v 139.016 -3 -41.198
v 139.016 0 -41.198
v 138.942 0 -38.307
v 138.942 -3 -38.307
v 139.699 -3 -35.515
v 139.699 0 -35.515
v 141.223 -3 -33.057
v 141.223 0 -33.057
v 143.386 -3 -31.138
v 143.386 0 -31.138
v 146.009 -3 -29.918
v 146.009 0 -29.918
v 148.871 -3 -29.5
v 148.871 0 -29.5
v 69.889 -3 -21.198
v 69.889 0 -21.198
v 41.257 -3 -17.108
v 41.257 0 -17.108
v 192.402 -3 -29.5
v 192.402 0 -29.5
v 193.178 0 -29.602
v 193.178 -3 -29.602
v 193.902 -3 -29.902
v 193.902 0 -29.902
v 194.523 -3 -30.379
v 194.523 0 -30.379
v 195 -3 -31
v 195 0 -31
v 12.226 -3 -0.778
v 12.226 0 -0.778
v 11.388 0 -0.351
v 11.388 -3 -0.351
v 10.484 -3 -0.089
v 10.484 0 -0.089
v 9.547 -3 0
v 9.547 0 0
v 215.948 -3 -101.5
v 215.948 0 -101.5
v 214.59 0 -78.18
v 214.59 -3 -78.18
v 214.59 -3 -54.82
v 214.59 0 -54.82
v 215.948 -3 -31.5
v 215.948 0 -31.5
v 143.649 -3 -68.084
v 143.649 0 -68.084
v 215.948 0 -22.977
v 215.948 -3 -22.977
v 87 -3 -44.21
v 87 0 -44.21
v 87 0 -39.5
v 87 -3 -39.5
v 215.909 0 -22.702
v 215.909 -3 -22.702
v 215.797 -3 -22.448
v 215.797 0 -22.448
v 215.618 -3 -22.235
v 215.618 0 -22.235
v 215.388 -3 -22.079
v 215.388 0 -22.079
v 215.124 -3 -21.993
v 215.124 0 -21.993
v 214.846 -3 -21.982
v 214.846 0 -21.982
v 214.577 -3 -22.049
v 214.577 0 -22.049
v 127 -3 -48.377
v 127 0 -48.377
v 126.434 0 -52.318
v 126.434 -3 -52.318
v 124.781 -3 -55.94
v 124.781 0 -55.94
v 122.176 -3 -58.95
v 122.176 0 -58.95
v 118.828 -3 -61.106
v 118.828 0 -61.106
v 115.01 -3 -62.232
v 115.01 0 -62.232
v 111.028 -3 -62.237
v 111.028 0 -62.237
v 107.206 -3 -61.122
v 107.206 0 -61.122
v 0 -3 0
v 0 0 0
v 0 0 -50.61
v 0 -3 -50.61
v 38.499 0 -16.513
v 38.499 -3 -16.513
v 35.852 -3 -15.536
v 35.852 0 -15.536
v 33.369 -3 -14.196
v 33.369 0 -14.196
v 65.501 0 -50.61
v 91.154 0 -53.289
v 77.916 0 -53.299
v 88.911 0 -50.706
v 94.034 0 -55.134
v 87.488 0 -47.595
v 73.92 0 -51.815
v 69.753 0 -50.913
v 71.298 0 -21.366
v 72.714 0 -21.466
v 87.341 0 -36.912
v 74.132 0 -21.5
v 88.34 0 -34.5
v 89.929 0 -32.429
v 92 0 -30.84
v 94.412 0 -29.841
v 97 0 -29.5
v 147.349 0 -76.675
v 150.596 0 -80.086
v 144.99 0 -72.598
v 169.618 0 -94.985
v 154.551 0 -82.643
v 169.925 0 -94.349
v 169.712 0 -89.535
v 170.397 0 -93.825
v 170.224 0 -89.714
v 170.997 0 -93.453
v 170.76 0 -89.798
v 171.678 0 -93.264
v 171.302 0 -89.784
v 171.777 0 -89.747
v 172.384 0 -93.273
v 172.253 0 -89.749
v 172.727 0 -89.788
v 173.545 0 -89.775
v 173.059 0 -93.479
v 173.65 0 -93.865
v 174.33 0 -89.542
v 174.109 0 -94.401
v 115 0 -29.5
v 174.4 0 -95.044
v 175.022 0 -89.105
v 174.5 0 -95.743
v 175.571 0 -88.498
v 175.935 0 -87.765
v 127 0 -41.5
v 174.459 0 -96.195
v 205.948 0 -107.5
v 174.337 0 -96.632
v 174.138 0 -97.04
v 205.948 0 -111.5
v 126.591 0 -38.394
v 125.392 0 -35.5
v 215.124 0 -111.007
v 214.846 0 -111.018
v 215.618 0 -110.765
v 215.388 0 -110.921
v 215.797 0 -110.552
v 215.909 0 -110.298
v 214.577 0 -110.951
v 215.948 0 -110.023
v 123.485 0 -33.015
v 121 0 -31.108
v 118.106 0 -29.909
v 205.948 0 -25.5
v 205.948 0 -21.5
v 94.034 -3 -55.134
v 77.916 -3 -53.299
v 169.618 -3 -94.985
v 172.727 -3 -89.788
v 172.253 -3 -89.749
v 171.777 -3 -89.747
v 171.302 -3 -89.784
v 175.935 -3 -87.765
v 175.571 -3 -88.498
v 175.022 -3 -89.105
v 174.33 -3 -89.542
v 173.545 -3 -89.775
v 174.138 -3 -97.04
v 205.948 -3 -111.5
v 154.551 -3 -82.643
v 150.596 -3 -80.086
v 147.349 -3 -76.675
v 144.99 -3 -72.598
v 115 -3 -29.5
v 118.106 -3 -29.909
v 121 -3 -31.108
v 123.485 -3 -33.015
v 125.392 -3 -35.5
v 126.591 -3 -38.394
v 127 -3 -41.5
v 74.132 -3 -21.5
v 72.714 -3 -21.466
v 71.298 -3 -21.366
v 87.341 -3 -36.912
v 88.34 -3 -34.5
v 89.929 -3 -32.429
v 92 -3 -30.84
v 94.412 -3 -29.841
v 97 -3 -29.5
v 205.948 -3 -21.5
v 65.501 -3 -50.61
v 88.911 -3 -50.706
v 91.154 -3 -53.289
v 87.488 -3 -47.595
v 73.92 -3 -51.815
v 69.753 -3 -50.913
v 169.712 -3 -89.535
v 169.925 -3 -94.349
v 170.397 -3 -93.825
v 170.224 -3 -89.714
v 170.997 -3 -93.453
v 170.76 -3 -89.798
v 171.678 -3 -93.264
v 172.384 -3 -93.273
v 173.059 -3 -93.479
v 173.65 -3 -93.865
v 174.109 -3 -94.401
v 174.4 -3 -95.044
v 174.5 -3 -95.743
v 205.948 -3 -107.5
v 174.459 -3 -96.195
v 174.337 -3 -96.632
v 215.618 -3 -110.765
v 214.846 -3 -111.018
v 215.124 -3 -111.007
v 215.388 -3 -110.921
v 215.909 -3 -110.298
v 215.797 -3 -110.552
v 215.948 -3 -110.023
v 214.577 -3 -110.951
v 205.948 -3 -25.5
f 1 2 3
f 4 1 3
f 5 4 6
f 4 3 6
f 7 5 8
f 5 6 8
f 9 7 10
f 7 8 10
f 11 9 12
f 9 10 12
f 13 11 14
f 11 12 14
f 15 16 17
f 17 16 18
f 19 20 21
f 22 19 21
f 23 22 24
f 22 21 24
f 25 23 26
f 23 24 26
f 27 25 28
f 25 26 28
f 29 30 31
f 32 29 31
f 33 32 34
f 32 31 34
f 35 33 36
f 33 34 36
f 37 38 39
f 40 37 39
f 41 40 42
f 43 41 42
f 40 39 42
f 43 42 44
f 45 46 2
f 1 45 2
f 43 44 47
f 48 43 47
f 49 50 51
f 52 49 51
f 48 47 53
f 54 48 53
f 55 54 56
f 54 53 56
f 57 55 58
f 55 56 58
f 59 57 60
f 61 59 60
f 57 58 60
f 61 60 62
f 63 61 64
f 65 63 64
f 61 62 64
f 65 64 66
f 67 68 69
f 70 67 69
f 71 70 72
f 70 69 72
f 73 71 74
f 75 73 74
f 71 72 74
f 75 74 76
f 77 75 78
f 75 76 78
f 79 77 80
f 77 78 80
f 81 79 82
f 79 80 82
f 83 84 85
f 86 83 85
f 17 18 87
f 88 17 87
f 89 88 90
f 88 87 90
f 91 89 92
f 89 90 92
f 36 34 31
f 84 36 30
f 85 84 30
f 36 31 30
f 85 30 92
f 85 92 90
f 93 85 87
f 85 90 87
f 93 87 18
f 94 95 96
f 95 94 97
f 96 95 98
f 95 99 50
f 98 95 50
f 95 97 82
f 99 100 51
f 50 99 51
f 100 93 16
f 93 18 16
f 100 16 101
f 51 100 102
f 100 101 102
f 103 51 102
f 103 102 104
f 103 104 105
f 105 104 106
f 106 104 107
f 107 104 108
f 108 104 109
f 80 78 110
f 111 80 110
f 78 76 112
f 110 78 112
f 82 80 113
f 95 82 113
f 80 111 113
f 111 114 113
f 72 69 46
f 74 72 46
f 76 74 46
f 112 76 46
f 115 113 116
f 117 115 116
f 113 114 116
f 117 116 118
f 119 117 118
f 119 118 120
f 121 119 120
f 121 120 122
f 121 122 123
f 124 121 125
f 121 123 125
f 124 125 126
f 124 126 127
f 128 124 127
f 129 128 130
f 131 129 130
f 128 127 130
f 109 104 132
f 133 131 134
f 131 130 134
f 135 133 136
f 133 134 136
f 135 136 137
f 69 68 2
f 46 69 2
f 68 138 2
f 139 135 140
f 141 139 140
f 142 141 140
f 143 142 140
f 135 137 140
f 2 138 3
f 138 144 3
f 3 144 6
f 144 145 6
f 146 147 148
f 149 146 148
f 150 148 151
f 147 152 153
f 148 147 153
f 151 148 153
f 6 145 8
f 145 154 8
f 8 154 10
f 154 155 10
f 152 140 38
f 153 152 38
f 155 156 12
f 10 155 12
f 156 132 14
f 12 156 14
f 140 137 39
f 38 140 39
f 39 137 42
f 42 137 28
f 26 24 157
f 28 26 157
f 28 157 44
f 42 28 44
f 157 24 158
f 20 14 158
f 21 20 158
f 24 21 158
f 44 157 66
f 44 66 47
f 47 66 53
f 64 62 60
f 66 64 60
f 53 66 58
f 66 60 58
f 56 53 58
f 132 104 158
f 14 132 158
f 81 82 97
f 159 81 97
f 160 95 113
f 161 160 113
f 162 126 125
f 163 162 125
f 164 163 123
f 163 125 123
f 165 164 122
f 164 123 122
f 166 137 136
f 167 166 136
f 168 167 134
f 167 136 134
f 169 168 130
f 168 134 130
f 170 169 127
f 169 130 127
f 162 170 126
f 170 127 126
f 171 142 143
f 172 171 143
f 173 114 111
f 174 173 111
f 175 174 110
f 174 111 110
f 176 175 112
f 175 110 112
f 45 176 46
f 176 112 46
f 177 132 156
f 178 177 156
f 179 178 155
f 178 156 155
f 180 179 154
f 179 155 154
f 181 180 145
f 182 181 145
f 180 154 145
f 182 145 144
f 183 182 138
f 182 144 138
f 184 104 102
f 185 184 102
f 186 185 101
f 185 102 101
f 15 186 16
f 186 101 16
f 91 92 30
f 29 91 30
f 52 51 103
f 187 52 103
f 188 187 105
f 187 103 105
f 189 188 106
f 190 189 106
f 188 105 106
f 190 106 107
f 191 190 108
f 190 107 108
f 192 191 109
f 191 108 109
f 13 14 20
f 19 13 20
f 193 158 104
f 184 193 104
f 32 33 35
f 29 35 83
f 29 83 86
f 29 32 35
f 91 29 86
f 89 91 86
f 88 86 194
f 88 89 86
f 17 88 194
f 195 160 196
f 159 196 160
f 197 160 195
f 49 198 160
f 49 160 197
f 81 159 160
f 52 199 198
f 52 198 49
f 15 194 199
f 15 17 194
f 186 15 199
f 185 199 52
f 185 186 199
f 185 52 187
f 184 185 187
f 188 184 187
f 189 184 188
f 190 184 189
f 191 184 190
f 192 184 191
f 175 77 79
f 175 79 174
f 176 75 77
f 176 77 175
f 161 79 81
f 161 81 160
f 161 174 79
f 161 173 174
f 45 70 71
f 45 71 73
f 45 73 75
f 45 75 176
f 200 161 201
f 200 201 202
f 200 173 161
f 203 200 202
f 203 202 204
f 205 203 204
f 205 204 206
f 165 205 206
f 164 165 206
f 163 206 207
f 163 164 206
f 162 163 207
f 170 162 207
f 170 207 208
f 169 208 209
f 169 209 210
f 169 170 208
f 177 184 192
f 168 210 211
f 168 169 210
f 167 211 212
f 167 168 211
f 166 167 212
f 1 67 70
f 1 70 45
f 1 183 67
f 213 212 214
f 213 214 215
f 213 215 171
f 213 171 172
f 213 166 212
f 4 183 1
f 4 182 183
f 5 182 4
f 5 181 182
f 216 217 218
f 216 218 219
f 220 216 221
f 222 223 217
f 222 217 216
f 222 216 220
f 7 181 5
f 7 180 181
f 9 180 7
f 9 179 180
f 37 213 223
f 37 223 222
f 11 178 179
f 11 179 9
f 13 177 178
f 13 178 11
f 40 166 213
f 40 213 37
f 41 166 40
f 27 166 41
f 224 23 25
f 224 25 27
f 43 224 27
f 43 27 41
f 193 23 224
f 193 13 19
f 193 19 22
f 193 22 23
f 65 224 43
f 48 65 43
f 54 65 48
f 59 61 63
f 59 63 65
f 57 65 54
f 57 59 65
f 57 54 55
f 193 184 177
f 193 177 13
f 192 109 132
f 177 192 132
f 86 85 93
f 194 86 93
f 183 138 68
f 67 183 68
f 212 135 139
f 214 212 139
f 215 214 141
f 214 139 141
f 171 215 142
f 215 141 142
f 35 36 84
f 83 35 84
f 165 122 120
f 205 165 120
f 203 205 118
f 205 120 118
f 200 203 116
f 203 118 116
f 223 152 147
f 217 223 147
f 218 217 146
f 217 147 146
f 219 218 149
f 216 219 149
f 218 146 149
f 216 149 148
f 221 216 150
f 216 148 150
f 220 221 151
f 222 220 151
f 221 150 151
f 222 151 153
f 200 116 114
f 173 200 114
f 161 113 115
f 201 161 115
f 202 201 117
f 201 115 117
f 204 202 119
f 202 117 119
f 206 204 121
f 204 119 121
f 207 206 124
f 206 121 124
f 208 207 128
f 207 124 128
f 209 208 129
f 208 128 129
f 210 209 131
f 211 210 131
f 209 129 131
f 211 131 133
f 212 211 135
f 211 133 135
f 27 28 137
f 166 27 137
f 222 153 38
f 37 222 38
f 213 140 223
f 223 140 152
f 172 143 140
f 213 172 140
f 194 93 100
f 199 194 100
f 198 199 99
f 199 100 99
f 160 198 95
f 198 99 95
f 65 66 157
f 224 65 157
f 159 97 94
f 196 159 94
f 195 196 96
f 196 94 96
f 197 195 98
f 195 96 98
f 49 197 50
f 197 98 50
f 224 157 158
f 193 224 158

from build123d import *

# Parameters (mm, degrees)
F1_DEPTH = 3


with BuildPart() as f1:
    # F0 (on Front) → F1 (new body)
    with BuildSketch(Plane.XZ):
        with BuildLine():
            Line((9.547373, 0), (0, 0))
            Line((0, 0), (0, -50.61))
            Line((0, -50.61), (65.50128, -50.61))
            ThreePointArc((65.50128, -50.61), (71.852686, -51.290047), (77.916141, -53.299357))
            Line((77.916141, -53.299357), (169.617761, -94.98504))
            ThreePointArc((169.617761, -94.98504), (172.383668, -93.272901), (174.5, -95.743285))
            ThreePointArc((174.5, -95.743285), (174.407699, -96.416327), (174.137612, -97.039671))
            Line((174.137612, -97.039671), (205.947947, -111.5))
            Line((205.947947, -111.5), (205.947947, -107.5))
            Line((205.947947, -107.5), (214.576557, -110.951444))
            ThreePointArc((214.576557, -110.951444), (215.508576, -110.851034), (215.947947, -110.022967))
            Line((215.947947, -110.022967), (215.947947, -101.5))
            ThreePointArc((215.947947, -101.5), (214.419617, -66.5), (215.947947, -31.5))
            Line((215.947947, -31.5), (215.947947, -22.977033))
            ThreePointArc((215.947947, -22.977033), (215.508576, -22.148966), (214.576557, -22.048556))
            Line((214.576557, -22.048556), (205.947947, -25.5))
            Line((205.947947, -25.5), (205.947947, -21.5))
            Line((205.947947, -21.5), (74.132034, -21.5))
            ThreePointArc((74.132034, -21.5), (72.005364, -21.424526), (69.889394, -21.198485))
            Line((69.889394, -21.198485), (41.25714, -17.108163))
            ThreePointArc((41.25714, -17.108163), (37.158324, -16.07119), (33.369079, -14.195761))
            Line((33.369079, -14.195761), (12.226495, -0.778353))
            ThreePointArc((12.226495, -0.778353), (10.942322, -0.19853), (9.547373, 0))
        make_face()
        with BuildLine():
            ThreePointArc((139.015857, -41.198191), (141.222671, -33.057249), (148.870609, -29.5))
            Line((148.870609, -29.5), (192.401924, -29.5))
            ThreePointArc((192.401924, -29.5), (193.901924, -29.901924), (195, -31))
            Line((195, -31), (175.934504, -87.76478))
            ThreePointArc((175.934504, -87.76478), (174.690897, -89.347155), (172.727083, -89.787502))
            ThreePointArc((172.727083, -89.787502), (172.014742, -89.743303), (171.302191, -89.784002))
            ThreePointArc((171.302191, -89.784002), (170.490013, -89.768373), (169.711801, -89.535424))
            Line((169.711801, -89.535424), (154.550645, -82.643472))
            ThreePointArc((154.550645, -82.643472), (147.348811, -76.674589), (143.648817, -68.083663))
            Line((143.648817, -68.083663), (139.015857, -41.198191))
        make_face(mode=Mode.SUBTRACT)
        with BuildLine():
            ThreePointArc((87, -39.5), (89.928932, -32.428932), (97, -29.5))
            Line((97, -29.5), (115, -29.5))
            ThreePointArc((115, -29.5), (123.485281, -33.014719), (127, -41.5))
            Line((127, -41.5), (127, -48.376778))
            ThreePointArc((127, -48.376778), (120.579234, -60.147726), (107.206398, -61.121745))
            Line((107.206398, -61.121745), (94.034056, -55.133867))
            ThreePointArc((94.034056, -55.133867), (88.910616, -50.706096), (87, -44.20961))
            Line((87, -44.20961), (87, -39.5))
        make_face(mode=Mode.SUBTRACT)
    extrude(amount=F1_DEPTH)


solid = f1.part
